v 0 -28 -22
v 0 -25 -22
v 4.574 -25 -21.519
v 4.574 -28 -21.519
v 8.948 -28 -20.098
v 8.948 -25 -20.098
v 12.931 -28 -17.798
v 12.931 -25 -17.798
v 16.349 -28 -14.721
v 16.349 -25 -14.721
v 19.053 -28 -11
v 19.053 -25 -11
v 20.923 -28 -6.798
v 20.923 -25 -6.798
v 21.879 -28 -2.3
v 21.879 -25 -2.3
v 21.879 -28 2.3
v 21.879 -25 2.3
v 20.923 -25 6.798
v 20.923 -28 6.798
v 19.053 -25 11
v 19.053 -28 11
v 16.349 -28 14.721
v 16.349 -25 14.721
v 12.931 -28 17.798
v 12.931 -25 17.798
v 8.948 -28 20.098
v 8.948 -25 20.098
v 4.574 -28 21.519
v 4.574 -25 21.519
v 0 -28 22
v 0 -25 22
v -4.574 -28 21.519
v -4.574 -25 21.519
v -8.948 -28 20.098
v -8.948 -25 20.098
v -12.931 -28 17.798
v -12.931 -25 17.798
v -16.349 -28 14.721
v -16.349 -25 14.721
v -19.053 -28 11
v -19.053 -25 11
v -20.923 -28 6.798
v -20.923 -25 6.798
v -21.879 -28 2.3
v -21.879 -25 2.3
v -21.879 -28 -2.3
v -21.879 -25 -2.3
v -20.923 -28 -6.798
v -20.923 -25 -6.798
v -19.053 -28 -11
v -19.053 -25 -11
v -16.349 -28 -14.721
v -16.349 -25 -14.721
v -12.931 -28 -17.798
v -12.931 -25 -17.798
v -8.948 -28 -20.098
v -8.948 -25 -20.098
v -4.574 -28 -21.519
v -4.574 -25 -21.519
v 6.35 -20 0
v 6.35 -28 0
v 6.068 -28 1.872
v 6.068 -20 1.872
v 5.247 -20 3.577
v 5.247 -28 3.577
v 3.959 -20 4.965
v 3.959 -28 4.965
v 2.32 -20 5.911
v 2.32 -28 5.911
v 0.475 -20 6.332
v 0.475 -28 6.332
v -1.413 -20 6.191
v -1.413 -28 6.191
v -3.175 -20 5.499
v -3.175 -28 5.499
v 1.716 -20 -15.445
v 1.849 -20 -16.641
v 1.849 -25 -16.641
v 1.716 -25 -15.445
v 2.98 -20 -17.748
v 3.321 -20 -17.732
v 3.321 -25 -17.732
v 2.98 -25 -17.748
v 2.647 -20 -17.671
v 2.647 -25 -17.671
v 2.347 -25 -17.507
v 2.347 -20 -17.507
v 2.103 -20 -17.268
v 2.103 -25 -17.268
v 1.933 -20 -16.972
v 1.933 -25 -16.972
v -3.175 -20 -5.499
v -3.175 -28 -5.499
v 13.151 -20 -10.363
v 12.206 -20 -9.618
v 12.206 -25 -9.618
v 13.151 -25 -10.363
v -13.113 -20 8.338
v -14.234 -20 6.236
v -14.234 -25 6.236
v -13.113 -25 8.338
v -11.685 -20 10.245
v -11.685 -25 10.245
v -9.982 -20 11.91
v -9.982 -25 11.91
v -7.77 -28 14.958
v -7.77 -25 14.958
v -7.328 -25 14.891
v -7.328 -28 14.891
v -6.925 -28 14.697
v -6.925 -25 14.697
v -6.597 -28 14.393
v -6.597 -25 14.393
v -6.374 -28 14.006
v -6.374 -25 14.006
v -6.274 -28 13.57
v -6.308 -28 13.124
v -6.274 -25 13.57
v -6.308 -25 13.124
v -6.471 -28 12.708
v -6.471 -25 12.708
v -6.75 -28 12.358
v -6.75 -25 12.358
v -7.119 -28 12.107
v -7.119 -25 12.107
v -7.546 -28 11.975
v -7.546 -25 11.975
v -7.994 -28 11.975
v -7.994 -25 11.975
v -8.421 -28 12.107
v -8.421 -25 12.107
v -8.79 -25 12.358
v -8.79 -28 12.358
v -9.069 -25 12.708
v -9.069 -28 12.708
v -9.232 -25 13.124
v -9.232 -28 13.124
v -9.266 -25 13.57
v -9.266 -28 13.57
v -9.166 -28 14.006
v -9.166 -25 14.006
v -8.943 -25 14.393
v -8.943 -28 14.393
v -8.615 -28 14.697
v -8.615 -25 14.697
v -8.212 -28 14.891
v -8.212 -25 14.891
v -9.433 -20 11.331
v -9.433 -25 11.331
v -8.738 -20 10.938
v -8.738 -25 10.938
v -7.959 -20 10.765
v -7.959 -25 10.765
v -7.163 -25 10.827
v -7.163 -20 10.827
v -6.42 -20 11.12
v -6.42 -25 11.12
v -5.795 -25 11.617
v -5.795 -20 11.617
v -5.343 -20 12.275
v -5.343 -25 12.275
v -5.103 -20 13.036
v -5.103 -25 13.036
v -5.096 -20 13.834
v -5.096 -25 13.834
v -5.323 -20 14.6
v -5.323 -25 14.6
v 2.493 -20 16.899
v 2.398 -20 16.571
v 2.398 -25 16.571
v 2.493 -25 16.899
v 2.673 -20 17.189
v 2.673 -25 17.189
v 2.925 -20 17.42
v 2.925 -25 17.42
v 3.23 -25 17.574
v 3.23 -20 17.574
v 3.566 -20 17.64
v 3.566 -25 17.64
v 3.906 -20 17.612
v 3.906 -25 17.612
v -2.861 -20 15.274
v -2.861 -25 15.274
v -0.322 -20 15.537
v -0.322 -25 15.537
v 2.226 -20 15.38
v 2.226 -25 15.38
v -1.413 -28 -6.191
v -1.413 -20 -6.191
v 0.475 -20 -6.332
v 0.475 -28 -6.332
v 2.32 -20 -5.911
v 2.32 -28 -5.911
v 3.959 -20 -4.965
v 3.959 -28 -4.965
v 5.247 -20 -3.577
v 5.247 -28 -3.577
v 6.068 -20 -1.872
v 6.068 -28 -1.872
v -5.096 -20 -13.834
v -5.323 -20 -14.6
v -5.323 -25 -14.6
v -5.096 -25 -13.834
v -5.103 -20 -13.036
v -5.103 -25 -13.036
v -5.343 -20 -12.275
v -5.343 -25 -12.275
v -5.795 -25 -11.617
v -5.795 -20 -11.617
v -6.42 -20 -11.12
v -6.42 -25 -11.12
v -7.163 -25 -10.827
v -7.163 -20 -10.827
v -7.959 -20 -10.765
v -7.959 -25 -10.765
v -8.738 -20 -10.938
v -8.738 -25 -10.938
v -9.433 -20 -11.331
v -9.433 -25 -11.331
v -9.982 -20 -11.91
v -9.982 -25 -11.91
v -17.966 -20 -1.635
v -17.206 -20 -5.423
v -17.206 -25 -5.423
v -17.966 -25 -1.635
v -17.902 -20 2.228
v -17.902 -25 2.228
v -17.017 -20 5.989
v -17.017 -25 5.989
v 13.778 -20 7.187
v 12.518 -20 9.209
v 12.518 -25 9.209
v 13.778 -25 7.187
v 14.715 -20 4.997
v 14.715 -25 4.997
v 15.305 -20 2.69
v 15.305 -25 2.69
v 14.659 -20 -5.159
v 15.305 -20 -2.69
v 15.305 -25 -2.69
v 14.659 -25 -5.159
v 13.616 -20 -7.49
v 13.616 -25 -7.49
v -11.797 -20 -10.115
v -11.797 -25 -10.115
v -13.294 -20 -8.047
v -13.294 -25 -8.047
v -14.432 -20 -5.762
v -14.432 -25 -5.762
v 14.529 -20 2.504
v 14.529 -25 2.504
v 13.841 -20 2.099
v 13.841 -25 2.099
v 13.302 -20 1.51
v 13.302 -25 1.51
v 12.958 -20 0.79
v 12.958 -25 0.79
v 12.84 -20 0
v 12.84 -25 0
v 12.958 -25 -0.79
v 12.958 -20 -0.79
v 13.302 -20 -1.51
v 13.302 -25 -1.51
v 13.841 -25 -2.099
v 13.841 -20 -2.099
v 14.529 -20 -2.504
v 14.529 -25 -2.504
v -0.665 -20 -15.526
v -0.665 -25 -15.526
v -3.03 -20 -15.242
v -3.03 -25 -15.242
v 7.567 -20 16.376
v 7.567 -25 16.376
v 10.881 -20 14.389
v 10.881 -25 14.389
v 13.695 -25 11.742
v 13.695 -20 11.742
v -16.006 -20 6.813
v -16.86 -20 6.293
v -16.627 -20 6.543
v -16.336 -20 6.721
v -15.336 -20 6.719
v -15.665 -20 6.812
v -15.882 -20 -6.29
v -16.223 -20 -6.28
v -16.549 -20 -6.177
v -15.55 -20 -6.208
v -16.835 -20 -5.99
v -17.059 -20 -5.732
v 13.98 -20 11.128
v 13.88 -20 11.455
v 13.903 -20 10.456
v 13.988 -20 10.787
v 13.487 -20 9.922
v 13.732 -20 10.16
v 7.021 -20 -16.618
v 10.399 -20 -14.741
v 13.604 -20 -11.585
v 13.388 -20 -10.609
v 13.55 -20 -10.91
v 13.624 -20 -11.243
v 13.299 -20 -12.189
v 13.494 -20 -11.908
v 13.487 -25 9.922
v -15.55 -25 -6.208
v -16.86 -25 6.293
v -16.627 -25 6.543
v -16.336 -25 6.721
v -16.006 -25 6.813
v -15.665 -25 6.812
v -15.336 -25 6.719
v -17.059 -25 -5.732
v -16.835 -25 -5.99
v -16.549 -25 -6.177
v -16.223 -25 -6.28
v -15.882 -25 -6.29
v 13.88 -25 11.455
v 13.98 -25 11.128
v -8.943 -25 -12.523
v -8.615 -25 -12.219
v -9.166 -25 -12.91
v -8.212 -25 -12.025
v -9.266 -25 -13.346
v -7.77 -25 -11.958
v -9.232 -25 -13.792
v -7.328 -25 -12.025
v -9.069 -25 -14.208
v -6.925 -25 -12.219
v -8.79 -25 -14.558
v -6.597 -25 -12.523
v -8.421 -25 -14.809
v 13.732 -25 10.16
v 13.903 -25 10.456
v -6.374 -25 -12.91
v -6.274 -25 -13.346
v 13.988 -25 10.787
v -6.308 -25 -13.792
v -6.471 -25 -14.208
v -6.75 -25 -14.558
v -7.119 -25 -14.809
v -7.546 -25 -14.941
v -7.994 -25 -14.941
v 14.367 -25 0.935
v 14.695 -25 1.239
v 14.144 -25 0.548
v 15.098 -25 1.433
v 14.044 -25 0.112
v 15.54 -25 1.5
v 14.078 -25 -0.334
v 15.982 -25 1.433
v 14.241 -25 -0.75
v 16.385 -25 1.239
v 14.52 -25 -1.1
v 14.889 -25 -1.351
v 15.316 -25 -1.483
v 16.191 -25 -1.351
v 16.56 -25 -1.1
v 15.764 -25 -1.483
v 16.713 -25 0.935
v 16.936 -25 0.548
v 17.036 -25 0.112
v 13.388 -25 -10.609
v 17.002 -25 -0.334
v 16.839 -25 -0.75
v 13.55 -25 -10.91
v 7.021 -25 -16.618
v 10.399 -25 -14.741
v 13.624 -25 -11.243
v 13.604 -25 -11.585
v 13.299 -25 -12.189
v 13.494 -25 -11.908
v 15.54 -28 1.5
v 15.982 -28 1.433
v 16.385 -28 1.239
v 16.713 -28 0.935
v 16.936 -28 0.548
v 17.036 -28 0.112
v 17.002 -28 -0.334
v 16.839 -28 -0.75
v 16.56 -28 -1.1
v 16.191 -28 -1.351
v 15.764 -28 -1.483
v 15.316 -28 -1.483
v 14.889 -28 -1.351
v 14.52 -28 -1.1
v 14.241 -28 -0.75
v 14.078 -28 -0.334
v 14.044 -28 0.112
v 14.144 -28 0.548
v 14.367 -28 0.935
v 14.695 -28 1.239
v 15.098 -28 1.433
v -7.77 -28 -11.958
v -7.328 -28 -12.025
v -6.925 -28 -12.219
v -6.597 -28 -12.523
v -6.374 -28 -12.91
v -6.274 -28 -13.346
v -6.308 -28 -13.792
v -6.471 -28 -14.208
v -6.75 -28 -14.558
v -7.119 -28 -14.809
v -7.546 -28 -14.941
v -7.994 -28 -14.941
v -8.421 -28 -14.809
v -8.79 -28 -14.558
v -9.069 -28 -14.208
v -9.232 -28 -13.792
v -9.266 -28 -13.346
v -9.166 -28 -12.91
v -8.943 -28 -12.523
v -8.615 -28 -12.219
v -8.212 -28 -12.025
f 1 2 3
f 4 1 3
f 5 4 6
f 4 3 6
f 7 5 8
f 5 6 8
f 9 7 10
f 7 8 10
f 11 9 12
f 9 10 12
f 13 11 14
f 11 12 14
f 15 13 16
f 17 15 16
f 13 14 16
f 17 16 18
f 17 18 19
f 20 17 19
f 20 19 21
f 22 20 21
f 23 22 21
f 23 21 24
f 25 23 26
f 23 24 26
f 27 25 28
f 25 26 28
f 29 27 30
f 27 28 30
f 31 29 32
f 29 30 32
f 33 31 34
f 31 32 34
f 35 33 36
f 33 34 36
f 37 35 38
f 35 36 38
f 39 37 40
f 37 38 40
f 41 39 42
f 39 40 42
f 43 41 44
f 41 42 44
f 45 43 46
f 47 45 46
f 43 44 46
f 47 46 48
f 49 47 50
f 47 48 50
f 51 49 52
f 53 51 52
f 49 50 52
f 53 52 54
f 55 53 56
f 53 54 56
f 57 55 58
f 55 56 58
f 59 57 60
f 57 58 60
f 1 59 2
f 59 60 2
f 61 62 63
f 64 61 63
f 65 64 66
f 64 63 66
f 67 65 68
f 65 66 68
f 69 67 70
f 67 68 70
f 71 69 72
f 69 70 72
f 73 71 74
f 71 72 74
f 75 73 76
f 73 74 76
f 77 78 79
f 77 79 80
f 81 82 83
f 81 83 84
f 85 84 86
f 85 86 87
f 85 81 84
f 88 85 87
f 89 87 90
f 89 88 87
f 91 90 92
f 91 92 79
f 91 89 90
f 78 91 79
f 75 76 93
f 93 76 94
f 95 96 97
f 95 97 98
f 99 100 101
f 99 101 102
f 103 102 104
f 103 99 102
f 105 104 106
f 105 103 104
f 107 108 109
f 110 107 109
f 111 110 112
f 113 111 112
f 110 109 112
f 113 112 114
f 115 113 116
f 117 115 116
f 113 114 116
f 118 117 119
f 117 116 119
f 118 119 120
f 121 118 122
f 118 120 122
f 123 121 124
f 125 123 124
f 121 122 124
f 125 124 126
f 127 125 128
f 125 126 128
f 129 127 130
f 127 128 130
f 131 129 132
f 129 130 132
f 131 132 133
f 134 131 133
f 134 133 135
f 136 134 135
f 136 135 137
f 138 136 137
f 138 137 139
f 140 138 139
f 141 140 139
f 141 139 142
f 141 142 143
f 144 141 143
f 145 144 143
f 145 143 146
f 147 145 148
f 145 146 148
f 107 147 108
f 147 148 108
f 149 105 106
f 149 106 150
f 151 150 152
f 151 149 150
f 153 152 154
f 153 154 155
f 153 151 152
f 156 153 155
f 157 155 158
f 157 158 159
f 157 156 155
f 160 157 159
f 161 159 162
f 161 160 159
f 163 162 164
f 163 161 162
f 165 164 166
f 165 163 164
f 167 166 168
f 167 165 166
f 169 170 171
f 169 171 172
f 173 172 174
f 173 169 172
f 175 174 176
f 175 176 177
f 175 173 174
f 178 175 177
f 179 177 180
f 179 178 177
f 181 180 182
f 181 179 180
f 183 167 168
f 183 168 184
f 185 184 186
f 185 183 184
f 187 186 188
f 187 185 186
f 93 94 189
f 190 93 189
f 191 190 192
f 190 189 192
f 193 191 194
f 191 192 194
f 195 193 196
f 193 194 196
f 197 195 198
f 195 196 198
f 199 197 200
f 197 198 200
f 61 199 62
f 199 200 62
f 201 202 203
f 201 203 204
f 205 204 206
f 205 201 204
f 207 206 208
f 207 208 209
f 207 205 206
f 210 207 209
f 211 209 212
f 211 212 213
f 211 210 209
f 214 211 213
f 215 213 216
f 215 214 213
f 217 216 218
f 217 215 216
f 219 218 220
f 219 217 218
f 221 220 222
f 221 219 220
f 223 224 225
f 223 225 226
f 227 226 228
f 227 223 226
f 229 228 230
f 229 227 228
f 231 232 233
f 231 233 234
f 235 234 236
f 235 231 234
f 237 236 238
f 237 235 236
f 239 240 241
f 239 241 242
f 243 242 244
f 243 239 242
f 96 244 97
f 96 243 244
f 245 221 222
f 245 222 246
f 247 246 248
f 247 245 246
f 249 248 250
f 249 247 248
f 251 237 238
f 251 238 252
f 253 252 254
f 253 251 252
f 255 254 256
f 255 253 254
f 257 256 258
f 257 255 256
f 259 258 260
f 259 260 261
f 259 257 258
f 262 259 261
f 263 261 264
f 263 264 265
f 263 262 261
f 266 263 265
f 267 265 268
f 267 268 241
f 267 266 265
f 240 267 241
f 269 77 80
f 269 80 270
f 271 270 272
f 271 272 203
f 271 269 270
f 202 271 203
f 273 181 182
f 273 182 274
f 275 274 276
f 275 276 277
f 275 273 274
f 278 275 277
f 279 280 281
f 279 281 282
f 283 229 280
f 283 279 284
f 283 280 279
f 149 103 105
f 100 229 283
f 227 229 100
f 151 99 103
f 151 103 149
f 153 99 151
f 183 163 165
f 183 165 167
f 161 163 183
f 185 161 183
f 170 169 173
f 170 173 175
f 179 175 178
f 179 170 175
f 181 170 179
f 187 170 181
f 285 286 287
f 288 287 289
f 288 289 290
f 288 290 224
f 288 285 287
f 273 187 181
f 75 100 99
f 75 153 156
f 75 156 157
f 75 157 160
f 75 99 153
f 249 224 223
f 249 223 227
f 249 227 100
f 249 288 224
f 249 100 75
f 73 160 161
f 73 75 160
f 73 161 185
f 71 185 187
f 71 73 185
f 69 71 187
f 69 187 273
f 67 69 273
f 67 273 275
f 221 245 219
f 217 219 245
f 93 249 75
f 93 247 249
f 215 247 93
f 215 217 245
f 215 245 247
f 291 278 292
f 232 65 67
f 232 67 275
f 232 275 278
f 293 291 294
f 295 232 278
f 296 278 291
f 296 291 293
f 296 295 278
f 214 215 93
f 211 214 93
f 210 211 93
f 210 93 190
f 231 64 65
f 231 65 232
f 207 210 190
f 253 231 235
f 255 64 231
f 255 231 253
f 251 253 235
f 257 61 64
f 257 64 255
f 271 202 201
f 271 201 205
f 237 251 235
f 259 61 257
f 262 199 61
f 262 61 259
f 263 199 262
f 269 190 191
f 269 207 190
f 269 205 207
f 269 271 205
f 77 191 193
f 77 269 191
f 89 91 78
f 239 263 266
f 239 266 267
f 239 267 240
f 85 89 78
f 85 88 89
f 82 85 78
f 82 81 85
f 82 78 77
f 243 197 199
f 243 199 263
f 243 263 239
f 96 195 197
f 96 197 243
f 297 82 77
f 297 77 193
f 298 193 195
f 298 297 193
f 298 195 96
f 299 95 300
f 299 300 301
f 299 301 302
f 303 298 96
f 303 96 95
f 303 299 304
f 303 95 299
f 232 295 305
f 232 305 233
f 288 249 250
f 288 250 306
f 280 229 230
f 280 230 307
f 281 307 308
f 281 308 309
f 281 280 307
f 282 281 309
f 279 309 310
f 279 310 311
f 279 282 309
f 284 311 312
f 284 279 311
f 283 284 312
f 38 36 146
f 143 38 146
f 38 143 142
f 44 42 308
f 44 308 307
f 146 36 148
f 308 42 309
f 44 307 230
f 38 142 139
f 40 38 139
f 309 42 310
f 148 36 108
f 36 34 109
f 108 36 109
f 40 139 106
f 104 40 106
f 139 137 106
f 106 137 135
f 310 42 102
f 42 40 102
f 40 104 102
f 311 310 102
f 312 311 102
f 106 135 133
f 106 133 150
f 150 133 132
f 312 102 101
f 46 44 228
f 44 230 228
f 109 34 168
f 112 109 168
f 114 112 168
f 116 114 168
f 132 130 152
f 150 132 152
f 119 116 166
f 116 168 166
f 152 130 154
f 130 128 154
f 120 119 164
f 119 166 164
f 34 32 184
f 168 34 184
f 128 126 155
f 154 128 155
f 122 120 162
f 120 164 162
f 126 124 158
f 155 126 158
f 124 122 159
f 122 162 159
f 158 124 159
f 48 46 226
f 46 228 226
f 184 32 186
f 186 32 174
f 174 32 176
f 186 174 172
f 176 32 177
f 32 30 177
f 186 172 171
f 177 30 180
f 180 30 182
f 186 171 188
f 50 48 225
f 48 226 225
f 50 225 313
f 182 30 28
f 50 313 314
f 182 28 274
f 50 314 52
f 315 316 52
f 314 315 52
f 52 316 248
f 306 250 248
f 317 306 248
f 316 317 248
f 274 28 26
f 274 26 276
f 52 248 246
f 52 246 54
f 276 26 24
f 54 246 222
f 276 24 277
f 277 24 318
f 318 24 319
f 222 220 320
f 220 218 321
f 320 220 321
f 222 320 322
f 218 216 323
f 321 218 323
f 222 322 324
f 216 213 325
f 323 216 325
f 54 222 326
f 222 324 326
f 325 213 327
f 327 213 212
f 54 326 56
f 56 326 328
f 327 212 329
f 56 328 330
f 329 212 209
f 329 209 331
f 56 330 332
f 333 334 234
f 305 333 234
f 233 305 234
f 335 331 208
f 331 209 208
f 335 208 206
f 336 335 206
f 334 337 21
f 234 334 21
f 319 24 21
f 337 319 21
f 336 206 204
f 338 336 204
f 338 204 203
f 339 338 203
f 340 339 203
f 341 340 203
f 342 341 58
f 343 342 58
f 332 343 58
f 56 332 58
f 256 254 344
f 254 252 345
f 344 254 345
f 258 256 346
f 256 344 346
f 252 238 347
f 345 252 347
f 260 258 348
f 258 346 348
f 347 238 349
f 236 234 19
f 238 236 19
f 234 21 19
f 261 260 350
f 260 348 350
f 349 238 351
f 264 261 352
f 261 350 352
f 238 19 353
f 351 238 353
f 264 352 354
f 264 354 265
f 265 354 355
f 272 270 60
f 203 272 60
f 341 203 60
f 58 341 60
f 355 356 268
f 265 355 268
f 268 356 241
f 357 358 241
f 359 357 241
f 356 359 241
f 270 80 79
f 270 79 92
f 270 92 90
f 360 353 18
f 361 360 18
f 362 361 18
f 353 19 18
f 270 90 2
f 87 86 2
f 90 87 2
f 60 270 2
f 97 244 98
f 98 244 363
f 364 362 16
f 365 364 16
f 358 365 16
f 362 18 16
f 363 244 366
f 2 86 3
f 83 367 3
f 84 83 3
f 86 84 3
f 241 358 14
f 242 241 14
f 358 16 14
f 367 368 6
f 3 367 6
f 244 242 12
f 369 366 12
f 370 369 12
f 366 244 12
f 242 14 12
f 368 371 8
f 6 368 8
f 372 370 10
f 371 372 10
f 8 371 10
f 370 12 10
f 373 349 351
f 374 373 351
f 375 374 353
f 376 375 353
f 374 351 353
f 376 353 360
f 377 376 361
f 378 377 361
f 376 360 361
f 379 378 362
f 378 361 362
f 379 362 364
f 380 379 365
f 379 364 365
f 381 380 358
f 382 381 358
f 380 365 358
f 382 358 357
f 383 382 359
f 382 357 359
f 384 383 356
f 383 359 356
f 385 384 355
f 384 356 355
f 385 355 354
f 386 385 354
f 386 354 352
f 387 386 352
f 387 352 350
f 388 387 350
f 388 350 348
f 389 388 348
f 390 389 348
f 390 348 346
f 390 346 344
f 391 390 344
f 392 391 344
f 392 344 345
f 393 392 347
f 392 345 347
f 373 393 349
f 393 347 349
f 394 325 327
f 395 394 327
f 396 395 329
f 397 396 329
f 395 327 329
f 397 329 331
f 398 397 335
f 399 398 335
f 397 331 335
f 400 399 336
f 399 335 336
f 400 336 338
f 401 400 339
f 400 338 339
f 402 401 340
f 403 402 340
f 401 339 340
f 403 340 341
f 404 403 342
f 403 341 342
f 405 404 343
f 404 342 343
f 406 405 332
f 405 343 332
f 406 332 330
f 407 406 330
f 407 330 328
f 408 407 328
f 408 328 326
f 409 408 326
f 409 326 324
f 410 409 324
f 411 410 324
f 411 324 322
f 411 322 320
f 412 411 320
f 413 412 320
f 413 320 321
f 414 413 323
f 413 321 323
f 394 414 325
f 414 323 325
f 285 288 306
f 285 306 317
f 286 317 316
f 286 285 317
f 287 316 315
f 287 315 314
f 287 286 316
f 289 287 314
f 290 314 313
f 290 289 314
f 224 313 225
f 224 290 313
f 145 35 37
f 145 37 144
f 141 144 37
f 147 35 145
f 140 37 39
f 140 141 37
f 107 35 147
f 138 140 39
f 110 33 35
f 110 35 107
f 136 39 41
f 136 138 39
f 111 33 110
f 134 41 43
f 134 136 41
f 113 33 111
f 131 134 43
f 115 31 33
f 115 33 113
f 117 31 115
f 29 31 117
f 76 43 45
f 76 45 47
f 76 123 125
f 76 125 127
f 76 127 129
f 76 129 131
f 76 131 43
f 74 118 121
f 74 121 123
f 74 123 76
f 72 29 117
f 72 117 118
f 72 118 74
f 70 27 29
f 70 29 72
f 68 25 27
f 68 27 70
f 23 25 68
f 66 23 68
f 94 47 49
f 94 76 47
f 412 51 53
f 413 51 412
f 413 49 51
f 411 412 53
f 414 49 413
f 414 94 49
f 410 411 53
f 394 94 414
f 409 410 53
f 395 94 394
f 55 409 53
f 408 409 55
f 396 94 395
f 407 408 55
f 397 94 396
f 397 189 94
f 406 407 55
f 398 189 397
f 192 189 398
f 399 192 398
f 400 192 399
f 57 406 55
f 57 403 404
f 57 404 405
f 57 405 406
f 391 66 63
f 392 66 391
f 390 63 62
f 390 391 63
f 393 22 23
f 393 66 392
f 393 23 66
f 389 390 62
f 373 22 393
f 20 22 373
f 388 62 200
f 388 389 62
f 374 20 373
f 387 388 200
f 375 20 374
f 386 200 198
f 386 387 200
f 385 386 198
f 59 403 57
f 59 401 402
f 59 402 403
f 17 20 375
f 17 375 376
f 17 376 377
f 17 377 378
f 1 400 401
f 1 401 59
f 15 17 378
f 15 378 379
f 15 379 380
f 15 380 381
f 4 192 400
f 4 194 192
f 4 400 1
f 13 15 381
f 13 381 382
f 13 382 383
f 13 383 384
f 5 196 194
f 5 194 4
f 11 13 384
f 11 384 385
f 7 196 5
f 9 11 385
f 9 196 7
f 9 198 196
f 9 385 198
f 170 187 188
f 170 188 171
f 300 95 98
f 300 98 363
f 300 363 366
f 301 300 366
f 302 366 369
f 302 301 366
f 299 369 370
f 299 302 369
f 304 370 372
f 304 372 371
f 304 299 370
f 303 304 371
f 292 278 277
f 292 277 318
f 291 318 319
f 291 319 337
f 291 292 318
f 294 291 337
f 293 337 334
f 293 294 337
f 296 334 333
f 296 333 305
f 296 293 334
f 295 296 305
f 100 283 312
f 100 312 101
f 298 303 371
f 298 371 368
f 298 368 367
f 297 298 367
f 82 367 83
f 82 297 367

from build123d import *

# Parameters (mm, degrees)
SKETCH1_R           = 19.54
SKETCH1_R_2         = 15.54
BOSS_EXTRUDE1_DEPTH = 7.9
SKETCH1_3_R         = 2.7
BOSS_EXTRUDE2_DEPTH = 7.9
SKETCH1_4_R         = 1.5
CUT_EXTRUDE1_DEPTH  = 29.740793308
CUT_EXTRUDE2_DEPTH  = 29.740793308
SKETCH1_6_R         = 1.5
CUT_EXTRUDE5_DEPTH  = 3
CIRPATTERN1_COUNT   = 3
SKETCH2_R           = 26
SKETCH2_R_2         = 19.54
BOSS_EXTRUDE3_DEPTH = 7.9
CUT_EXTRUDE4_START  = 7.9
SKETCH2_3_R         = 22
SKETCH2_3_R_2       = 19.54
CUT_EXTRUDE4_DEPTH  = 3.14
CUT_EXTRUDE6_START  = 3
SKETCH2_4_R         = 22
CUT_EXTRUDE6_DEPTH  = 3
BOSS_EXTRUDE5_DEPTH = 5
SKETCH5_R           = 22
BOSS_EXTRUDE6_DEPTH = 3
SKETCH6_R           = 1.5
CUT_EXTRUDE7_DEPTH  = 3
CUT_EXTRUDE8_DEPTH  = 15


with BuildPart() as part:
    # Sketch1 → Boss-Extrude1 (new body)
    with BuildSketch(Plane(origin=(0, 0, 0), x_dir=(1, 0, 0), z_dir=(0, 1, 0))):
        with Locations(Location((0, 0, 0), (0, 0, 270))):
            Circle(SKETCH1_R)
        with Locations(Location((0, 0, 0), (0, 0, 270))):
            Circle(SKETCH1_R_2, mode=Mode.SUBTRACT)
    extrude(amount=BOSS_EXTRUDE1_DEPTH)

    # Sketch1<3> → Boss-Extrude2 (add)
    with BuildSketch(Plane(origin=(0, 0, 0), x_dir=(1, 0, 0), z_dir=(0, 1, 0))):
        with Locations((15.54, 0)):
            Circle(SKETCH1_3_R)
    boss_extrude2 = extrude(amount=BOSS_EXTRUDE2_DEPTH)

    # Sketch1<4> → Cut-Extrude1 (cut, symmetric)
    with BuildSketch(Plane(origin=(0, 0, 0), x_dir=(1, 0, 0), z_dir=(0, 1, 0))):
        with Locations(Location((15.54, 0, 0), (0, 0, 270))):
            Circle(SKETCH1_4_R)
    cut_extrude1 = extrude(amount=CUT_EXTRUDE1_DEPTH, both=True, mode=Mode.SUBTRACT)

    # Sketch1<5> → Cut-Extrude2 (cut, symmetric)
    with BuildSketch(Plane(origin=(0, 0, 0), x_dir=(1, 0, 0), z_dir=(0, 1, 0))):
        with BuildLine():
            Line((1.84893352, 16.641004923), (1.716044464, 15.444960065))
            ThreePointArc((1.716044464, 15.444960065), (7.546281877, 13.584742538), (12.206193142, 9.617715372))
            Line((12.206193142, 9.617715372), (13.151430585, 10.362503249))
            ThreePointArc((13.151430585, 10.362503249), (13.623726964, 11.24345363), (13.299320972, 12.188915525))
            ThreePointArc((13.299320972, 12.188915525), (8.760291222, 15.770190161), (3.321432407, 17.731601359))
            ThreePointArc((3.321432407, 17.731601359), (2.347317501, 17.507463762), (1.84893352, 16.641004923))
        make_face()
    cut_extrude2 = extrude(amount=CUT_EXTRUDE2_DEPTH, both=True, mode=Mode.SUBTRACT)

    # Sketch1<6> → Cut-Extrude5 (cut)
    with BuildSketch(Plane(origin=(0, 0, 0), x_dir=(1, 0, 0), z_dir=(0, 1, 0))):
        with BuildLine():
            Line((13.541549805, -7.623518144), (14.590196156, -8.213877046))
            ThreePointArc((14.590196156, -8.213877046), (15.584628409, -8.315079224), (16.335293585, -7.655049543))
            ThreePointArc((16.335293585, -7.655049543), (17.48108114, -4.455715676), (18.006537967, -1.098267026))
            ThreePointArc((18.006537967, -1.098267026), (18.24, 0), (18.006537967, 1.098267026))
            ThreePointArc((18.006537967, 1.098267026), (17.48108114, 4.455715676), (16.335293585, 7.655049543))
            ThreePointArc((16.335293585, 7.655049543), (15.584628409, 8.315079224), (14.590196156, 8.213877046))
            Line((14.590196156, 8.213877046), (13.541549805, 7.623518144))
            ThreePointArc((13.541549805, 7.623518144), (14.632931196, 5.231531765), (15.305444015, 2.689792462))
            ThreePointArc((15.305444015, 2.689792462), (12.84, 0), (15.305444015, -2.689792462))
            ThreePointArc((15.305444015, -2.689792462), (14.632931196, -5.231531765), (13.541549805, -7.623518144))
        make_face()
        with Locations(Location((15.54, 0, 0), (0, 0, 270))):
            Circle(SKETCH1_6_R, mode=Mode.SUBTRACT)
    cut_extrude5 = extrude(amount=CUT_EXTRUDE5_DEPTH, mode=Mode.SUBTRACT)

    # CirPattern1: Boss-Extrude2, Cut-Extrude1, Cut-Extrude2, Cut-Extrude5 ×3 about axis
    cirpattern1_axis = Axis((0, 0, 0), (0, 1, 0))
    add([boss_extrude2.rotate(cirpattern1_axis, i * 360 / CIRPATTERN1_COUNT) for i in range(1, CIRPATTERN1_COUNT)])
    add([cut_extrude1.rotate(cirpattern1_axis, i * 360 / CIRPATTERN1_COUNT) for i in range(1, CIRPATTERN1_COUNT)], mode=Mode.SUBTRACT)
    add([cut_extrude2.rotate(cirpattern1_axis, i * 360 / CIRPATTERN1_COUNT) for i in range(1, CIRPATTERN1_COUNT)], mode=Mode.SUBTRACT)
    add([cut_extrude5.rotate(cirpattern1_axis, i * 360 / CIRPATTERN1_COUNT) for i in range(1, CIRPATTERN1_COUNT)], mode=Mode.SUBTRACT)

    # Sketch2 → Boss-Extrude3 (add)
    with BuildSketch(Plane(origin=(0, 0, 0), x_dir=(1, 0, 0), z_dir=(0, 1, 0))):
        with Locations(Location((0, 0, 0), (0, 0, 270))):
            Circle(SKETCH2_R)
        Circle(SKETCH2_R_2, mode=Mode.SUBTRACT)
    extrude(amount=BOSS_EXTRUDE3_DEPTH)

    # Sketch2<3> → Cut-Extrude4 (cut)
    with BuildSketch(Plane(origin=(0, 0, 0), x_dir=(1, 0, 0), z_dir=(0, 1, 0)).offset(CUT_EXTRUDE4_START)):
        with Locations(Location((0, 0, 0), (0, 0, 270))):
            Circle(SKETCH2_3_R)
        with Locations(Location((0, 0, 0), (0, 0, 270))):
            Circle(SKETCH2_3_R_2, mode=Mode.SUBTRACT)
    extrude(amount=-CUT_EXTRUDE4_DEPTH, mode=Mode.SUBTRACT)

    # Sketch2<4> → Cut-Extrude6 (cut)
    with BuildSketch(Plane(origin=(0, 0, 0), x_dir=(1, 0, 0), z_dir=(0, 1, 0)).offset(CUT_EXTRUDE6_START)):
        with Locations(Location((0, 0, 0), (0, 0, 270))):
            Circle(SKETCH2_4_R)
    extrude(amount=-CUT_EXTRUDE6_DEPTH, mode=Mode.SUBTRACT)


with BuildPart() as body_2:
    # Sketch4 → Boss-Extrude5 (new body)
    with BuildSketch(Plane(origin=(0, -20, 0), x_dir=(-1, 0, 0), z_dir=(0, -1, 0))):
        with BuildLine():
            Line((14.432282409, 5.762015659), (15.549906352, 6.208221358))
            ThreePointArc((15.549906352, 6.208221358), (16.548980018, 6.176766972), (17.205570975, 5.423092055))
            ThreePointArc((17.205570975, 5.423092055), (18.037530912, -0.298460376), (17.016733405, -5.989355912))
            ThreePointArc((17.016733405, -5.989355912), (16.335567089, -6.72089531), (15.335999768, -6.719279063))
            Line((15.335999768, -6.719279063), (14.233750009, -6.236341932))
            ThreePointArc((14.233750009, -6.236341932), (12.435838525, -9.318879771), (9.982150611, -11.910007102))
            ThreePointArc((9.982150611, -11.910007102), (6.42, -11.119766185), (5.323293404, -14.599799565))
            ThreePointArc((5.323293404, -14.599799565), (1.596947601, -15.457728111), (-2.226089267, -15.379731031))
            Line((-2.226089267, -15.379731031), (-2.398475768, -16.570724607))
            ThreePointArc((-2.398475768, -16.570724607), (-2.925252898, -17.420220588), (-3.906250001, -17.612007578))
            ThreePointArc((-3.906250001, -17.612007578), (-9.277239724, -15.471729803), (-13.695301074, -11.742245462))
            ThreePointArc((-13.695301074, -11.742245462), (-13.988249619, -10.786568429), (-13.487066248, -9.92172586))
            Line((-13.487066248, -9.92172586), (-12.517705544, -9.208618132))
            ThreePointArc((-12.517705544, -9.208618132), (-14.288305879, -6.110312195), (-15.305444015, -2.689792462))
            ThreePointArc((-15.305444015, -2.689792462), (-12.84, 0), (-15.305444015, 2.689792462))
            ThreePointArc((-15.305444015, 2.689792462), (-14.18525903, 6.345866865), (-12.206193142, 9.617715372))
            Line((-12.206193142, 9.617715372), (-13.151430585, 10.362503249))
            ThreePointArc((-13.151430585, 10.362503249), (-13.62372712, 11.243453616), (-13.299320974, 12.188915524))
            ThreePointArc((-13.299320974, 12.188915524), (-8.760291188, 15.770190179), (-3.32143233, 17.731601374))
            ThreePointArc((-3.32143233, 17.731601374), (-2.347317469, 17.507463739), (-1.84893352, 16.641004923))
            Line((-1.84893352, 16.641004923), (-1.716044464, 15.444960065))
            ThreePointArc((-1.716044464, 15.444960065), (1.852467354, 15.429191965), (5.323293404, 14.599799565))
            ThreePointArc((5.323293404, 14.599799565), (6.42, 11.119766185), (9.982150611, 11.910007102))
            ThreePointArc((9.982150611, 11.910007102), (12.588311429, 9.111861247), (14.432282409, 5.762015659))
        make_face()
    extrude(amount=BOSS_EXTRUDE5_DEPTH)

    # Sketch5 → Boss-Extrude6 (add)
    with BuildSketch(Plane.XZ.offset(25)):
        with Locations(Location((0, 0, 0), (0, 0, 270))):
            Circle(SKETCH5_R)
    extrude(amount=BOSS_EXTRUDE6_DEPTH)

    # Sketch6 → Cut-Extrude7 (cut)
    with BuildSketch(Plane(origin=(0, -25, 0), x_dir=(1, 0, 0), z_dir=(0, 1, 0))):
        with Locations(Location((-7.77, 13.458034775, 0), (0, 0, 270))):
            Circle(SKETCH6_R)
        with Locations(Location((15.54, 0, 0), (0, 0, 270))):
            Circle(SKETCH6_R)
        with Locations(Location((-7.77, -13.458034775, 0), (0, 0, 270))):
            Circle(SKETCH6_R)
    extrude(amount=-CUT_EXTRUDE7_DEPTH, mode=Mode.SUBTRACT)

    # Sketch7 → Cut-Extrude8 (cut)
    with BuildSketch(Plane.XZ.offset(28)):
        with BuildLine():
            ThreePointArc((6.35, 0), (3.175, 5.499261314), (-3.175, 5.499261314))
            Line((-3.175, 5.499261314), (-3.175, -5.499261314))
            ThreePointArc((-3.175, -5.499261314), (3.175, -5.499261314), (6.35, 0))
        make_face()
    extrude(amount=-CUT_EXTRUDE8_DEPTH, mode=Mode.SUBTRACT)


solid = body_2.part
